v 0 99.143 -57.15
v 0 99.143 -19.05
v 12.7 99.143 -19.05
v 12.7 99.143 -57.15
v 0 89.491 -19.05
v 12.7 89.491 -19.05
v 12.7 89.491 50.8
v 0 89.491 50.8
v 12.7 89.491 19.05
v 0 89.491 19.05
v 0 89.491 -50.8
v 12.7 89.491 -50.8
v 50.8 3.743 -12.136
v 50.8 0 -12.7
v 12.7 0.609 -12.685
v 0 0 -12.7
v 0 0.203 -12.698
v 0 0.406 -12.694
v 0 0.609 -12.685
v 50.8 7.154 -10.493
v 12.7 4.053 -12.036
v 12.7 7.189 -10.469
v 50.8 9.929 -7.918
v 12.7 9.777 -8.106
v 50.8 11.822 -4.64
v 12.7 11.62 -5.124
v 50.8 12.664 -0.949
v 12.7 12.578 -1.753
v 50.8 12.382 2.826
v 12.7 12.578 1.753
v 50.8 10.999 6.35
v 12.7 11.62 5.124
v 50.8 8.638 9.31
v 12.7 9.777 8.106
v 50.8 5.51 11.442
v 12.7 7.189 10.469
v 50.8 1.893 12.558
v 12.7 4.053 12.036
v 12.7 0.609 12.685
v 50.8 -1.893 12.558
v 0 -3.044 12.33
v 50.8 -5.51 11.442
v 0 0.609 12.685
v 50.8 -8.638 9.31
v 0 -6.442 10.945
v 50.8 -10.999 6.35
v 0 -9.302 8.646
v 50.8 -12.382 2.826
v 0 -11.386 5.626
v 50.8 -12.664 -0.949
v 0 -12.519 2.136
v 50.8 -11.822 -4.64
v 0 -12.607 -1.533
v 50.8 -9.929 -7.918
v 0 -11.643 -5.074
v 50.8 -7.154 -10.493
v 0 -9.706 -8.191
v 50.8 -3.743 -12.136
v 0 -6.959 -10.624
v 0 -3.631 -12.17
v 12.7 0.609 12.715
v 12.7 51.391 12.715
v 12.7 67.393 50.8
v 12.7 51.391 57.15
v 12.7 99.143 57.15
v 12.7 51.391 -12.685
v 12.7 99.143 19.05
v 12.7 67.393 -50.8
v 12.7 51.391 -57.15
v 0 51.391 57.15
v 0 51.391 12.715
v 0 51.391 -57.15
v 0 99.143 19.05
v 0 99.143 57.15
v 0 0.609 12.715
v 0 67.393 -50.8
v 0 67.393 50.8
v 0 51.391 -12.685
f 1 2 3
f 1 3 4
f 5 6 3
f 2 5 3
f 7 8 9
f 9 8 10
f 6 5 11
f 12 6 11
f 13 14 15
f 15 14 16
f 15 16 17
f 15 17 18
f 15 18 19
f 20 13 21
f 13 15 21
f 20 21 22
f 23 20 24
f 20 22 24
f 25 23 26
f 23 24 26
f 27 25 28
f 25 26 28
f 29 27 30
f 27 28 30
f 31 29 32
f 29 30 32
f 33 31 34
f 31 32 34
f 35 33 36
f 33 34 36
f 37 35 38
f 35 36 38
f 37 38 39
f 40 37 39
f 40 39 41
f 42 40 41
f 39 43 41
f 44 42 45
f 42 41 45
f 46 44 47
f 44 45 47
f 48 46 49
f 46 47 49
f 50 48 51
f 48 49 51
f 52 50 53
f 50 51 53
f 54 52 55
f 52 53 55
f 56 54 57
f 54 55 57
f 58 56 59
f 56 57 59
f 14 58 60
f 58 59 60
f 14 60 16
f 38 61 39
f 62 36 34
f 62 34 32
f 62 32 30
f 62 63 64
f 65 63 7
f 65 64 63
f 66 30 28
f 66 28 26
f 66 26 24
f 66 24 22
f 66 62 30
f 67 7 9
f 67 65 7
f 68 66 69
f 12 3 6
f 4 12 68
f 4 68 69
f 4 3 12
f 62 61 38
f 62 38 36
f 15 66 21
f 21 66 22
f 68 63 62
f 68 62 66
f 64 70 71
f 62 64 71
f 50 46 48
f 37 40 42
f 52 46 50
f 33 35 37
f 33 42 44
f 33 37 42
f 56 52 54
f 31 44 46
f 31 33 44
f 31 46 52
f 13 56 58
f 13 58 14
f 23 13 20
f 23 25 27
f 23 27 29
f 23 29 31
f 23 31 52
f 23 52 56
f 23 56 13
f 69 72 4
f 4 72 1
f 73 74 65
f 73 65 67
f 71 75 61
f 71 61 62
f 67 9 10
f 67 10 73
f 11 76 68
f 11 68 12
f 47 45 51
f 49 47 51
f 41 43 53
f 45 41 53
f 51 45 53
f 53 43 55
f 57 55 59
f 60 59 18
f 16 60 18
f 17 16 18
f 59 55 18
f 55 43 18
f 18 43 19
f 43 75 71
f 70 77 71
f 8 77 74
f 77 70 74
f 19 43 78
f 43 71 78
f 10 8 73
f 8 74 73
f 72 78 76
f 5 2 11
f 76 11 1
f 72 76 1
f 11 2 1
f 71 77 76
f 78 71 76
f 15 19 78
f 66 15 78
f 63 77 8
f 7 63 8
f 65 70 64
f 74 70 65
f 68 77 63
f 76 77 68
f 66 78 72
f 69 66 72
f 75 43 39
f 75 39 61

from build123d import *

# Parameters (mm, degrees)
SKETCH2_R           = 12.7
BOSS_EXTRUDE1_DEPTH = 50.8
SKETCH3_W           = 25.4
SKETCH3_H           = 50.8
BOSS_EXTRUDE2_DEPTH = 12.7
SKETCH5_W           = 101.6
SKETCH5_H           = 16.002
BOSS_EXTRUDE3_DEPTH = 12.7
SKETCH6_W           = 6.35
SKETCH6_H           = 38.1
BOSS_EXTRUDE4_DEPTH = 12.7
SKETCH7_W           = 38.1
SKETCH7_H           = 9.652
BOSS_EXTRUDE5_DEPTH = 12.7


with BuildPart() as part:
    # Sketch2 → Boss-Extrude1 (new body)
    with BuildSketch(Plane(origin=(0, 0, 0), x_dir=(0, 0, -1), z_dir=(1, 0, 0))):
        Circle(SKETCH2_R)
    extrude(amount=BOSS_EXTRUDE1_DEPTH)

    # Sketch3 → Boss-Extrude2 (add)
    with BuildSketch(Plane.ZY):
        with Locations((0.014597196, 26.008732875)):
            Rectangle(SKETCH3_W, SKETCH3_H)
    extrude(amount=-BOSS_EXTRUDE2_DEPTH)


with BuildPart() as body_2:
    # Sketch5 → Boss-Extrude3 (new body)
    with BuildSketch(Plane(origin=(0, 0, 0), x_dir=(0, 0, -1), z_dir=(1, 0, 0))):
        with Locations((0, 59.392294155)):
            Rectangle(SKETCH5_W, SKETCH5_H)
    extrude(amount=BOSS_EXTRUDE3_DEPTH)

    # Sketch6 → Boss-Extrude4 (add)
    with BuildSketch(Plane(origin=(0, 0, 0), x_dir=(0, 0, -1), z_dir=(1, 0, 0))):
        with Locations((-53.975, 70.441294155)):
            Rectangle(SKETCH6_W, SKETCH6_H)
        with Locations((53.975, 70.441294155)):
            Rectangle(SKETCH6_W, SKETCH6_H)
    extrude(amount=BOSS_EXTRUDE4_DEPTH)

    # Sketch7 → Boss-Extrude5 (add)
    with BuildSketch(Plane(origin=(0, 0, 0), x_dir=(0, 0, -1), z_dir=(1, 0, 0))):
        with Locations((-38.1, 94.317294155)):
            Rectangle(SKETCH7_W, SKETCH7_H)
        with Locations((38.1, 94.317294155)):
            Rectangle(SKETCH7_W, SKETCH7_H)
    extrude(amount=BOSS_EXTRUDE5_DEPTH)


with BuildPart() as part_1:
    add(part.part)

    # Combine1: union body 2
    add(body_2.part)


solid = part_1.part
